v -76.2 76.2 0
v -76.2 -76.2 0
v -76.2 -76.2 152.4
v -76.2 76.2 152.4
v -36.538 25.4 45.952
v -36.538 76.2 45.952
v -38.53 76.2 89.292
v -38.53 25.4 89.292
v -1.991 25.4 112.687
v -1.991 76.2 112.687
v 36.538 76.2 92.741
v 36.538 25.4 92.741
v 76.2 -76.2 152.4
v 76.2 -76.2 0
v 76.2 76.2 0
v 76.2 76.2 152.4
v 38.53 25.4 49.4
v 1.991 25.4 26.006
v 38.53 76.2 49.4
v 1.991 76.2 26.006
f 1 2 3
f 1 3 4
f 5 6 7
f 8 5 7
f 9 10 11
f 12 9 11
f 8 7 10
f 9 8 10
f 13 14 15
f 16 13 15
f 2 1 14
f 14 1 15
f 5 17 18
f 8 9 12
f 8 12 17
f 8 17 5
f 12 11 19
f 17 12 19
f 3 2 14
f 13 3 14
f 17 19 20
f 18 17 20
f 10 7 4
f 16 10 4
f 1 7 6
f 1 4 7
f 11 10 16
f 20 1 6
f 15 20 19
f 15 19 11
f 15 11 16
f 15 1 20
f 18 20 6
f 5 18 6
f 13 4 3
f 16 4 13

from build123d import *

# Parameters (mm, degrees)
F0_W     = 152.4
F0_H     = 152.4
F1_DEPTH = 152.4
F5_DEPTH = 50.8


# Not quite as in the source:
# - the program builds the solid bodies; features that only make, move or delete a surface that nothing else refers to are left out


with BuildPart() as f1:
    # F0 (on Top) → F1 (new body)
    with BuildSketch(Plane.XY):
        Rectangle(F0_W, F0_H)
    extrude(amount=F1_DEPTH)

    # F4 (on face) → F5 (cut)
    with BuildSketch(Plane(origin=(0, 76.2, 0), x_dir=(-1, 0, 0), z_dir=(0, 1, 0))):
        Polygon((-1.9910766715, 26.005651243), (36.5384817123, 45.9516048431), (38.5295583838, 89.2921580002), (1.9910766715, 112.6867575571), (-36.5384817123, 92.740803957), (-38.5295583838, 49.4002507999), align=None)
    extrude(amount=-F5_DEPTH, mode=Mode.SUBTRACT)


solid = f1.part
